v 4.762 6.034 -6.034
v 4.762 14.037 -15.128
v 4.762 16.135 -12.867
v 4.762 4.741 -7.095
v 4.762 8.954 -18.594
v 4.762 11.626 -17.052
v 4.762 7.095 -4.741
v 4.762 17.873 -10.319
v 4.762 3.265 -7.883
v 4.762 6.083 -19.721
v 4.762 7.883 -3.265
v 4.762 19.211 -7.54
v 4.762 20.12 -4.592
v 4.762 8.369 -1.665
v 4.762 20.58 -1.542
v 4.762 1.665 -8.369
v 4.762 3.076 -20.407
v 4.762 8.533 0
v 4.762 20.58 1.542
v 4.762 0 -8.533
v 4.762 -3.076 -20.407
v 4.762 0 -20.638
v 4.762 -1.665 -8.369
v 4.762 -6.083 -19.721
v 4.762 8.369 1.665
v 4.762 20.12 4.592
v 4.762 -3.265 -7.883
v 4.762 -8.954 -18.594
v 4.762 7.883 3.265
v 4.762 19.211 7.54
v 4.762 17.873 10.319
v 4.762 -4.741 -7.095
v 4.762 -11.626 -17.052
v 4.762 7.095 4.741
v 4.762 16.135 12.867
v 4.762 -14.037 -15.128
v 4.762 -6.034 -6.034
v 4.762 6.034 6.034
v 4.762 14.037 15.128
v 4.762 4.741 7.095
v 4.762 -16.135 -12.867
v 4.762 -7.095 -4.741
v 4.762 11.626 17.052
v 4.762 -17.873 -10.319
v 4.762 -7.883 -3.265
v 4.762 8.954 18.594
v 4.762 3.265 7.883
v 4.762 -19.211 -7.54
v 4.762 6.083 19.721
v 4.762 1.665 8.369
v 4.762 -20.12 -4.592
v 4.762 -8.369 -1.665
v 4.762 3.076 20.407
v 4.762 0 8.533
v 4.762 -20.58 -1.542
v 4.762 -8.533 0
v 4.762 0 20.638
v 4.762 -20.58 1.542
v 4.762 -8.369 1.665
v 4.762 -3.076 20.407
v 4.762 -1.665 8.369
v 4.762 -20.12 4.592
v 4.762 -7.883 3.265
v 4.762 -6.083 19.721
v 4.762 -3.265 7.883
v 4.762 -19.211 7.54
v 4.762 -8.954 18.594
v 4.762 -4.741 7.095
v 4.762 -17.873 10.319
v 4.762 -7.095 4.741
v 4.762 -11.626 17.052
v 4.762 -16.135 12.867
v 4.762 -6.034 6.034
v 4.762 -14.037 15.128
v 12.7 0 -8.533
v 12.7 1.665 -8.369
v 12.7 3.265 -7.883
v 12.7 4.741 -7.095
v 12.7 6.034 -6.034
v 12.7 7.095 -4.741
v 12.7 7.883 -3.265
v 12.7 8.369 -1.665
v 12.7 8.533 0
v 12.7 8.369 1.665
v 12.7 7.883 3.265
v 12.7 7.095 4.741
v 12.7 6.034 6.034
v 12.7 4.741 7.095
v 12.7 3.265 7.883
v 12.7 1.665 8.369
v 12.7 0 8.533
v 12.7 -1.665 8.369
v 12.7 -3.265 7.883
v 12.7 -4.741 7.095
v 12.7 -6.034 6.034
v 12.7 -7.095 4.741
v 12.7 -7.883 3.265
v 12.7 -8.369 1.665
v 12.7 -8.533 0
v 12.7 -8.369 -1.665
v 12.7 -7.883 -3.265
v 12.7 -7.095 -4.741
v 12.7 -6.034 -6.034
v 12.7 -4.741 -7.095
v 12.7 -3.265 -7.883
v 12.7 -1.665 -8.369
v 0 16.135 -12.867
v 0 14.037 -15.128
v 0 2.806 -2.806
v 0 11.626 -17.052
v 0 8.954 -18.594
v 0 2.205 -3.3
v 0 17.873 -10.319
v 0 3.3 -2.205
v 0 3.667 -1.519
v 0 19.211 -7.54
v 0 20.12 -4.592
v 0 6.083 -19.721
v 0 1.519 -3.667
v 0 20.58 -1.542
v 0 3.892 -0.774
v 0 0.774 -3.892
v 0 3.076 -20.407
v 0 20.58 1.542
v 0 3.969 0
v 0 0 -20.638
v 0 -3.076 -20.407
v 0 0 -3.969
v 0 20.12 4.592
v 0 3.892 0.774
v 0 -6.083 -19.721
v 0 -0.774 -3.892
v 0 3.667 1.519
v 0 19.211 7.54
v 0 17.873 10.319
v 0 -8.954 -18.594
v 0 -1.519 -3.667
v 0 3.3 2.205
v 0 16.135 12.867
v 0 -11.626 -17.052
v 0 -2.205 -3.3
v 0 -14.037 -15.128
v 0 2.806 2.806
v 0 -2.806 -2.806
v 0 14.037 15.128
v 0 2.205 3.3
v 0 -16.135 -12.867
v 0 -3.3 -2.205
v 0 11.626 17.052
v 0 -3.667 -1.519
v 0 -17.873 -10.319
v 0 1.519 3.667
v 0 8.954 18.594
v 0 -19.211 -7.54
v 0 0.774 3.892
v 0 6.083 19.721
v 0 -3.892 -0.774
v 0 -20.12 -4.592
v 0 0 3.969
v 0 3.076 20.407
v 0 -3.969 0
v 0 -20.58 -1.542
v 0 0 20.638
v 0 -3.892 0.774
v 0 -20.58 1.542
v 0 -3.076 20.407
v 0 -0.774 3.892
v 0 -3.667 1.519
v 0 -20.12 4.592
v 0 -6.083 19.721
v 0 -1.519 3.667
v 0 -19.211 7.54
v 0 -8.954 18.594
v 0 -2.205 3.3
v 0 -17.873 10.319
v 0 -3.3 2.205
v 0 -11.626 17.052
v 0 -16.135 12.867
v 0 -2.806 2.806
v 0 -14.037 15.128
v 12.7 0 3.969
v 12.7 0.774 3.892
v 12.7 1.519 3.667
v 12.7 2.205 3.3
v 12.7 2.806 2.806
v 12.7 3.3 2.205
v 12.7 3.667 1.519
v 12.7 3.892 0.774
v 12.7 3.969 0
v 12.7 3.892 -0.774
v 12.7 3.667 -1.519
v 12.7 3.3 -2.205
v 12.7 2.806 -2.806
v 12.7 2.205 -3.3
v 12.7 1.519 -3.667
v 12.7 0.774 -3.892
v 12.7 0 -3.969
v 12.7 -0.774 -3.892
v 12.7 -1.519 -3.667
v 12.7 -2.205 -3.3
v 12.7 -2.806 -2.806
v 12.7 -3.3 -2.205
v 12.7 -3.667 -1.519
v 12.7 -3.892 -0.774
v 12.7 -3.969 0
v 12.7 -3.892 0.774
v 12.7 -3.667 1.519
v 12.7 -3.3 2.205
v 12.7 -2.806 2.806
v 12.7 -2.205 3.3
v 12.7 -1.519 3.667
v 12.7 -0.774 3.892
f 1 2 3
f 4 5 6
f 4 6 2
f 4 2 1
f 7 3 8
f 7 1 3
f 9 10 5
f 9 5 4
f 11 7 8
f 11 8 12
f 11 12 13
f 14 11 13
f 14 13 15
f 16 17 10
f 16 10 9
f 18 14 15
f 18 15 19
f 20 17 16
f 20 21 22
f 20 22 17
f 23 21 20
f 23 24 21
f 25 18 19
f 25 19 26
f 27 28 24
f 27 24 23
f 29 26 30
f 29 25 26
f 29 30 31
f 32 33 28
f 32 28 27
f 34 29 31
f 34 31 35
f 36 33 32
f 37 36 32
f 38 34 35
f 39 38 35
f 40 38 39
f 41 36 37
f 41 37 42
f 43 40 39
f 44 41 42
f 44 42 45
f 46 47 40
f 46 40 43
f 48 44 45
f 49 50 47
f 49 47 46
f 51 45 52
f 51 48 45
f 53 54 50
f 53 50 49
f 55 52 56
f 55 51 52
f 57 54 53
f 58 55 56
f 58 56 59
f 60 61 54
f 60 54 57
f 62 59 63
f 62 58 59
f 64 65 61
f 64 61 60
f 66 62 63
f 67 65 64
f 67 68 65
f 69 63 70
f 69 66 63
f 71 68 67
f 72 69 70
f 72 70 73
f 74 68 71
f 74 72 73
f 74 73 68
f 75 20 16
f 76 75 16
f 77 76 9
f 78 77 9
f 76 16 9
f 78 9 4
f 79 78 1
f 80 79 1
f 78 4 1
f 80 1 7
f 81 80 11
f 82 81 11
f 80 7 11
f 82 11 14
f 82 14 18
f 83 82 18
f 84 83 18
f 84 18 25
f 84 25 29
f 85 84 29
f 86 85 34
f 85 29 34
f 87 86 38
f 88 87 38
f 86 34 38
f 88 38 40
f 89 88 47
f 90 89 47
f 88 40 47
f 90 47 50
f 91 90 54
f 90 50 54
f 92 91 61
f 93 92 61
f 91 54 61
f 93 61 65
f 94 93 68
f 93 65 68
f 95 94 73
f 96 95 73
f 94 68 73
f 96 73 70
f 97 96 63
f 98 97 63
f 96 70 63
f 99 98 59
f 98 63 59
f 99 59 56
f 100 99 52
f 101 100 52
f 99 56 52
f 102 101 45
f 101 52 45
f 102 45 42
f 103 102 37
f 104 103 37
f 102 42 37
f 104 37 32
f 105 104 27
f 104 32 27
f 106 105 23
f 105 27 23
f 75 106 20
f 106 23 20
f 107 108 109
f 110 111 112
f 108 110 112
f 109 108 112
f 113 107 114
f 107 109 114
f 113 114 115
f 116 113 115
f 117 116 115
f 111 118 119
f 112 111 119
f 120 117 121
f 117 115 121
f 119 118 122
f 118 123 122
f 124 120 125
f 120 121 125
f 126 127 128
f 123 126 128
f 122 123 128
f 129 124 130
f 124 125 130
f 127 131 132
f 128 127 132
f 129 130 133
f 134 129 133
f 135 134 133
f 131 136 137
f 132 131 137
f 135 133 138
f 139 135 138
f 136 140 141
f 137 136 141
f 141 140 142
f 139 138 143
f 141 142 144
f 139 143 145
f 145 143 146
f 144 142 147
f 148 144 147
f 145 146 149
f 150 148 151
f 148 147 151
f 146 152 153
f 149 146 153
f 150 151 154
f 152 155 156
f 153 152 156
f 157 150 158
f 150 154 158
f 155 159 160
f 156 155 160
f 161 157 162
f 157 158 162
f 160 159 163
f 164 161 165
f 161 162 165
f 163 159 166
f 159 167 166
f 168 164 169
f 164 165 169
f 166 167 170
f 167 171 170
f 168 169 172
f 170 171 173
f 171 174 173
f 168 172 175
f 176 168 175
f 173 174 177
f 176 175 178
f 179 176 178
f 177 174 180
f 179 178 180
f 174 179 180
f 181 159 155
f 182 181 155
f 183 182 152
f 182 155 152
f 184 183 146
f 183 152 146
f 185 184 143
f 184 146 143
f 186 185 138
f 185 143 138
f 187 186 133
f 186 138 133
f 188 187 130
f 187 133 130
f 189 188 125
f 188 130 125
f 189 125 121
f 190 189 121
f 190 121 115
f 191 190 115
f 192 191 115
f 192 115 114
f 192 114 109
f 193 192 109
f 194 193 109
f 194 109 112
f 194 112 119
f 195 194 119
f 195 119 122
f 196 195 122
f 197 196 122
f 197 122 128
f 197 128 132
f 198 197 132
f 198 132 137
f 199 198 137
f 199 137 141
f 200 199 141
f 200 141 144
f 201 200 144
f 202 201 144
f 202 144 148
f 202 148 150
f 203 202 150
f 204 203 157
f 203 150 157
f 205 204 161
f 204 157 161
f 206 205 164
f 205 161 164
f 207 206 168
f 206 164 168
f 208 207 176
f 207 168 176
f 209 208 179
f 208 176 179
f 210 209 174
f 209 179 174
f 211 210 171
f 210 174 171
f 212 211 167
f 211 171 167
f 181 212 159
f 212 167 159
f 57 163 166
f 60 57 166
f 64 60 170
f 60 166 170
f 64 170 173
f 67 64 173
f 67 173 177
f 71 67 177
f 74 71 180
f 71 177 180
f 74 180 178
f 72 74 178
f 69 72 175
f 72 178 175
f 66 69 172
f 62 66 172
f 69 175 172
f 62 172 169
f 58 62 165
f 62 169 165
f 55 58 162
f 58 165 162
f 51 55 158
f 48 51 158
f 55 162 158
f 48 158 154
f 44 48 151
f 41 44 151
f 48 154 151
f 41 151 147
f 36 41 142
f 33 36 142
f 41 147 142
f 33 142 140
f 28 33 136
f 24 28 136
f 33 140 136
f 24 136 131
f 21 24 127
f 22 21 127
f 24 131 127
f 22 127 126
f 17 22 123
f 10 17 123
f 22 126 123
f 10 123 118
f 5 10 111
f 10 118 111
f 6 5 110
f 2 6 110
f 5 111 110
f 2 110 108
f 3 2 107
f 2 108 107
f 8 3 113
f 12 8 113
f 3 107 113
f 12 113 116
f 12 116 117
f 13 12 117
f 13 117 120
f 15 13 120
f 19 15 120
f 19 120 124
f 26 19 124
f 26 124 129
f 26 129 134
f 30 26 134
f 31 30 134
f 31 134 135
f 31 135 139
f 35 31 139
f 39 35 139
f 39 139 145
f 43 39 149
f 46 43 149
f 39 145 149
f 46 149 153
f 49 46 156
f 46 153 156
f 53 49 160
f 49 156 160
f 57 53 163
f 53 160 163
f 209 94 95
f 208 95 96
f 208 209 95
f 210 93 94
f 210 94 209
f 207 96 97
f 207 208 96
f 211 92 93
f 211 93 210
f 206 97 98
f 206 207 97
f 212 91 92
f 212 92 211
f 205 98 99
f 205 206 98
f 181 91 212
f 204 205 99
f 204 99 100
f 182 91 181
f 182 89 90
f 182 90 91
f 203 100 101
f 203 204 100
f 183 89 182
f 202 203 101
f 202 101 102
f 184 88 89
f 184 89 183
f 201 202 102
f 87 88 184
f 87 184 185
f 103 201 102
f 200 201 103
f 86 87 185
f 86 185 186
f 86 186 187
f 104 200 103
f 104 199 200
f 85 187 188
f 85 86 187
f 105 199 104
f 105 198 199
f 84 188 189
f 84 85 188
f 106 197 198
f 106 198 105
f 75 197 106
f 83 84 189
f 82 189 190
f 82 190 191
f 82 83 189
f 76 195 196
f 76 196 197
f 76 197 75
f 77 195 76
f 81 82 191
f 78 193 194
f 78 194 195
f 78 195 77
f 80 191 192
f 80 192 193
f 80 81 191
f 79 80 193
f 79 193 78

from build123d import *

# Parameters (mm, degrees)
SKETCH1_R                          = 20.6375
BOSS_EXTRUDE1_DEPTH                = 4.7625
SKETCH2_R                          = 8.5328125
BOSS_EXTRUDE2_DEPTH                = 7.9375
F_5_16_0_3125_DIAMETER_HOLE1_D     = 7.9375
F_5_16_0_3125_DIAMETER_HOLE1_DEPTH = 70.104
F_5_16_0_3125_DIAMETER_HOLE1_TIP   = 2.384665582


with BuildPart() as part:
    # Sketch1 → Boss-Extrude1 (new body)
    with BuildSketch(Plane(origin=(0, 0, 0), x_dir=(0, 0, -1), z_dir=(1, 0, 0))):
        with Locations(Location((0, 0, 0), (0, 0, 180))):
            Circle(SKETCH1_R)
    extrude(amount=BOSS_EXTRUDE1_DEPTH)

    # Sketch2 → Boss-Extrude2 (add)
    with BuildSketch(Plane(origin=(4.7625, 0, 0), x_dir=(0, 0, -1), z_dir=(1, 0, 0))):
        Circle(SKETCH2_R)
    extrude(amount=BOSS_EXTRUDE2_DEPTH)

    # 5/16 (0.3125) Diameter Hole1
    with Locations(Plane(origin=(12.7, 0, 0), x_dir=(0, 0, -1), z_dir=(1, 0, 0))):
        with Locations((0, 0)):
            Hole(F_5_16_0_3125_DIAMETER_HOLE1_D / 2, depth=F_5_16_0_3125_DIAMETER_HOLE1_DEPTH)
            with Locations((0, 0, -(F_5_16_0_3125_DIAMETER_HOLE1_DEPTH + F_5_16_0_3125_DIAMETER_HOLE1_TIP / 2))):  # 118° drill point
                Cone(0, F_5_16_0_3125_DIAMETER_HOLE1_D / 2, F_5_16_0_3125_DIAMETER_HOLE1_TIP, mode=Mode.SUBTRACT)


solid = part.part
